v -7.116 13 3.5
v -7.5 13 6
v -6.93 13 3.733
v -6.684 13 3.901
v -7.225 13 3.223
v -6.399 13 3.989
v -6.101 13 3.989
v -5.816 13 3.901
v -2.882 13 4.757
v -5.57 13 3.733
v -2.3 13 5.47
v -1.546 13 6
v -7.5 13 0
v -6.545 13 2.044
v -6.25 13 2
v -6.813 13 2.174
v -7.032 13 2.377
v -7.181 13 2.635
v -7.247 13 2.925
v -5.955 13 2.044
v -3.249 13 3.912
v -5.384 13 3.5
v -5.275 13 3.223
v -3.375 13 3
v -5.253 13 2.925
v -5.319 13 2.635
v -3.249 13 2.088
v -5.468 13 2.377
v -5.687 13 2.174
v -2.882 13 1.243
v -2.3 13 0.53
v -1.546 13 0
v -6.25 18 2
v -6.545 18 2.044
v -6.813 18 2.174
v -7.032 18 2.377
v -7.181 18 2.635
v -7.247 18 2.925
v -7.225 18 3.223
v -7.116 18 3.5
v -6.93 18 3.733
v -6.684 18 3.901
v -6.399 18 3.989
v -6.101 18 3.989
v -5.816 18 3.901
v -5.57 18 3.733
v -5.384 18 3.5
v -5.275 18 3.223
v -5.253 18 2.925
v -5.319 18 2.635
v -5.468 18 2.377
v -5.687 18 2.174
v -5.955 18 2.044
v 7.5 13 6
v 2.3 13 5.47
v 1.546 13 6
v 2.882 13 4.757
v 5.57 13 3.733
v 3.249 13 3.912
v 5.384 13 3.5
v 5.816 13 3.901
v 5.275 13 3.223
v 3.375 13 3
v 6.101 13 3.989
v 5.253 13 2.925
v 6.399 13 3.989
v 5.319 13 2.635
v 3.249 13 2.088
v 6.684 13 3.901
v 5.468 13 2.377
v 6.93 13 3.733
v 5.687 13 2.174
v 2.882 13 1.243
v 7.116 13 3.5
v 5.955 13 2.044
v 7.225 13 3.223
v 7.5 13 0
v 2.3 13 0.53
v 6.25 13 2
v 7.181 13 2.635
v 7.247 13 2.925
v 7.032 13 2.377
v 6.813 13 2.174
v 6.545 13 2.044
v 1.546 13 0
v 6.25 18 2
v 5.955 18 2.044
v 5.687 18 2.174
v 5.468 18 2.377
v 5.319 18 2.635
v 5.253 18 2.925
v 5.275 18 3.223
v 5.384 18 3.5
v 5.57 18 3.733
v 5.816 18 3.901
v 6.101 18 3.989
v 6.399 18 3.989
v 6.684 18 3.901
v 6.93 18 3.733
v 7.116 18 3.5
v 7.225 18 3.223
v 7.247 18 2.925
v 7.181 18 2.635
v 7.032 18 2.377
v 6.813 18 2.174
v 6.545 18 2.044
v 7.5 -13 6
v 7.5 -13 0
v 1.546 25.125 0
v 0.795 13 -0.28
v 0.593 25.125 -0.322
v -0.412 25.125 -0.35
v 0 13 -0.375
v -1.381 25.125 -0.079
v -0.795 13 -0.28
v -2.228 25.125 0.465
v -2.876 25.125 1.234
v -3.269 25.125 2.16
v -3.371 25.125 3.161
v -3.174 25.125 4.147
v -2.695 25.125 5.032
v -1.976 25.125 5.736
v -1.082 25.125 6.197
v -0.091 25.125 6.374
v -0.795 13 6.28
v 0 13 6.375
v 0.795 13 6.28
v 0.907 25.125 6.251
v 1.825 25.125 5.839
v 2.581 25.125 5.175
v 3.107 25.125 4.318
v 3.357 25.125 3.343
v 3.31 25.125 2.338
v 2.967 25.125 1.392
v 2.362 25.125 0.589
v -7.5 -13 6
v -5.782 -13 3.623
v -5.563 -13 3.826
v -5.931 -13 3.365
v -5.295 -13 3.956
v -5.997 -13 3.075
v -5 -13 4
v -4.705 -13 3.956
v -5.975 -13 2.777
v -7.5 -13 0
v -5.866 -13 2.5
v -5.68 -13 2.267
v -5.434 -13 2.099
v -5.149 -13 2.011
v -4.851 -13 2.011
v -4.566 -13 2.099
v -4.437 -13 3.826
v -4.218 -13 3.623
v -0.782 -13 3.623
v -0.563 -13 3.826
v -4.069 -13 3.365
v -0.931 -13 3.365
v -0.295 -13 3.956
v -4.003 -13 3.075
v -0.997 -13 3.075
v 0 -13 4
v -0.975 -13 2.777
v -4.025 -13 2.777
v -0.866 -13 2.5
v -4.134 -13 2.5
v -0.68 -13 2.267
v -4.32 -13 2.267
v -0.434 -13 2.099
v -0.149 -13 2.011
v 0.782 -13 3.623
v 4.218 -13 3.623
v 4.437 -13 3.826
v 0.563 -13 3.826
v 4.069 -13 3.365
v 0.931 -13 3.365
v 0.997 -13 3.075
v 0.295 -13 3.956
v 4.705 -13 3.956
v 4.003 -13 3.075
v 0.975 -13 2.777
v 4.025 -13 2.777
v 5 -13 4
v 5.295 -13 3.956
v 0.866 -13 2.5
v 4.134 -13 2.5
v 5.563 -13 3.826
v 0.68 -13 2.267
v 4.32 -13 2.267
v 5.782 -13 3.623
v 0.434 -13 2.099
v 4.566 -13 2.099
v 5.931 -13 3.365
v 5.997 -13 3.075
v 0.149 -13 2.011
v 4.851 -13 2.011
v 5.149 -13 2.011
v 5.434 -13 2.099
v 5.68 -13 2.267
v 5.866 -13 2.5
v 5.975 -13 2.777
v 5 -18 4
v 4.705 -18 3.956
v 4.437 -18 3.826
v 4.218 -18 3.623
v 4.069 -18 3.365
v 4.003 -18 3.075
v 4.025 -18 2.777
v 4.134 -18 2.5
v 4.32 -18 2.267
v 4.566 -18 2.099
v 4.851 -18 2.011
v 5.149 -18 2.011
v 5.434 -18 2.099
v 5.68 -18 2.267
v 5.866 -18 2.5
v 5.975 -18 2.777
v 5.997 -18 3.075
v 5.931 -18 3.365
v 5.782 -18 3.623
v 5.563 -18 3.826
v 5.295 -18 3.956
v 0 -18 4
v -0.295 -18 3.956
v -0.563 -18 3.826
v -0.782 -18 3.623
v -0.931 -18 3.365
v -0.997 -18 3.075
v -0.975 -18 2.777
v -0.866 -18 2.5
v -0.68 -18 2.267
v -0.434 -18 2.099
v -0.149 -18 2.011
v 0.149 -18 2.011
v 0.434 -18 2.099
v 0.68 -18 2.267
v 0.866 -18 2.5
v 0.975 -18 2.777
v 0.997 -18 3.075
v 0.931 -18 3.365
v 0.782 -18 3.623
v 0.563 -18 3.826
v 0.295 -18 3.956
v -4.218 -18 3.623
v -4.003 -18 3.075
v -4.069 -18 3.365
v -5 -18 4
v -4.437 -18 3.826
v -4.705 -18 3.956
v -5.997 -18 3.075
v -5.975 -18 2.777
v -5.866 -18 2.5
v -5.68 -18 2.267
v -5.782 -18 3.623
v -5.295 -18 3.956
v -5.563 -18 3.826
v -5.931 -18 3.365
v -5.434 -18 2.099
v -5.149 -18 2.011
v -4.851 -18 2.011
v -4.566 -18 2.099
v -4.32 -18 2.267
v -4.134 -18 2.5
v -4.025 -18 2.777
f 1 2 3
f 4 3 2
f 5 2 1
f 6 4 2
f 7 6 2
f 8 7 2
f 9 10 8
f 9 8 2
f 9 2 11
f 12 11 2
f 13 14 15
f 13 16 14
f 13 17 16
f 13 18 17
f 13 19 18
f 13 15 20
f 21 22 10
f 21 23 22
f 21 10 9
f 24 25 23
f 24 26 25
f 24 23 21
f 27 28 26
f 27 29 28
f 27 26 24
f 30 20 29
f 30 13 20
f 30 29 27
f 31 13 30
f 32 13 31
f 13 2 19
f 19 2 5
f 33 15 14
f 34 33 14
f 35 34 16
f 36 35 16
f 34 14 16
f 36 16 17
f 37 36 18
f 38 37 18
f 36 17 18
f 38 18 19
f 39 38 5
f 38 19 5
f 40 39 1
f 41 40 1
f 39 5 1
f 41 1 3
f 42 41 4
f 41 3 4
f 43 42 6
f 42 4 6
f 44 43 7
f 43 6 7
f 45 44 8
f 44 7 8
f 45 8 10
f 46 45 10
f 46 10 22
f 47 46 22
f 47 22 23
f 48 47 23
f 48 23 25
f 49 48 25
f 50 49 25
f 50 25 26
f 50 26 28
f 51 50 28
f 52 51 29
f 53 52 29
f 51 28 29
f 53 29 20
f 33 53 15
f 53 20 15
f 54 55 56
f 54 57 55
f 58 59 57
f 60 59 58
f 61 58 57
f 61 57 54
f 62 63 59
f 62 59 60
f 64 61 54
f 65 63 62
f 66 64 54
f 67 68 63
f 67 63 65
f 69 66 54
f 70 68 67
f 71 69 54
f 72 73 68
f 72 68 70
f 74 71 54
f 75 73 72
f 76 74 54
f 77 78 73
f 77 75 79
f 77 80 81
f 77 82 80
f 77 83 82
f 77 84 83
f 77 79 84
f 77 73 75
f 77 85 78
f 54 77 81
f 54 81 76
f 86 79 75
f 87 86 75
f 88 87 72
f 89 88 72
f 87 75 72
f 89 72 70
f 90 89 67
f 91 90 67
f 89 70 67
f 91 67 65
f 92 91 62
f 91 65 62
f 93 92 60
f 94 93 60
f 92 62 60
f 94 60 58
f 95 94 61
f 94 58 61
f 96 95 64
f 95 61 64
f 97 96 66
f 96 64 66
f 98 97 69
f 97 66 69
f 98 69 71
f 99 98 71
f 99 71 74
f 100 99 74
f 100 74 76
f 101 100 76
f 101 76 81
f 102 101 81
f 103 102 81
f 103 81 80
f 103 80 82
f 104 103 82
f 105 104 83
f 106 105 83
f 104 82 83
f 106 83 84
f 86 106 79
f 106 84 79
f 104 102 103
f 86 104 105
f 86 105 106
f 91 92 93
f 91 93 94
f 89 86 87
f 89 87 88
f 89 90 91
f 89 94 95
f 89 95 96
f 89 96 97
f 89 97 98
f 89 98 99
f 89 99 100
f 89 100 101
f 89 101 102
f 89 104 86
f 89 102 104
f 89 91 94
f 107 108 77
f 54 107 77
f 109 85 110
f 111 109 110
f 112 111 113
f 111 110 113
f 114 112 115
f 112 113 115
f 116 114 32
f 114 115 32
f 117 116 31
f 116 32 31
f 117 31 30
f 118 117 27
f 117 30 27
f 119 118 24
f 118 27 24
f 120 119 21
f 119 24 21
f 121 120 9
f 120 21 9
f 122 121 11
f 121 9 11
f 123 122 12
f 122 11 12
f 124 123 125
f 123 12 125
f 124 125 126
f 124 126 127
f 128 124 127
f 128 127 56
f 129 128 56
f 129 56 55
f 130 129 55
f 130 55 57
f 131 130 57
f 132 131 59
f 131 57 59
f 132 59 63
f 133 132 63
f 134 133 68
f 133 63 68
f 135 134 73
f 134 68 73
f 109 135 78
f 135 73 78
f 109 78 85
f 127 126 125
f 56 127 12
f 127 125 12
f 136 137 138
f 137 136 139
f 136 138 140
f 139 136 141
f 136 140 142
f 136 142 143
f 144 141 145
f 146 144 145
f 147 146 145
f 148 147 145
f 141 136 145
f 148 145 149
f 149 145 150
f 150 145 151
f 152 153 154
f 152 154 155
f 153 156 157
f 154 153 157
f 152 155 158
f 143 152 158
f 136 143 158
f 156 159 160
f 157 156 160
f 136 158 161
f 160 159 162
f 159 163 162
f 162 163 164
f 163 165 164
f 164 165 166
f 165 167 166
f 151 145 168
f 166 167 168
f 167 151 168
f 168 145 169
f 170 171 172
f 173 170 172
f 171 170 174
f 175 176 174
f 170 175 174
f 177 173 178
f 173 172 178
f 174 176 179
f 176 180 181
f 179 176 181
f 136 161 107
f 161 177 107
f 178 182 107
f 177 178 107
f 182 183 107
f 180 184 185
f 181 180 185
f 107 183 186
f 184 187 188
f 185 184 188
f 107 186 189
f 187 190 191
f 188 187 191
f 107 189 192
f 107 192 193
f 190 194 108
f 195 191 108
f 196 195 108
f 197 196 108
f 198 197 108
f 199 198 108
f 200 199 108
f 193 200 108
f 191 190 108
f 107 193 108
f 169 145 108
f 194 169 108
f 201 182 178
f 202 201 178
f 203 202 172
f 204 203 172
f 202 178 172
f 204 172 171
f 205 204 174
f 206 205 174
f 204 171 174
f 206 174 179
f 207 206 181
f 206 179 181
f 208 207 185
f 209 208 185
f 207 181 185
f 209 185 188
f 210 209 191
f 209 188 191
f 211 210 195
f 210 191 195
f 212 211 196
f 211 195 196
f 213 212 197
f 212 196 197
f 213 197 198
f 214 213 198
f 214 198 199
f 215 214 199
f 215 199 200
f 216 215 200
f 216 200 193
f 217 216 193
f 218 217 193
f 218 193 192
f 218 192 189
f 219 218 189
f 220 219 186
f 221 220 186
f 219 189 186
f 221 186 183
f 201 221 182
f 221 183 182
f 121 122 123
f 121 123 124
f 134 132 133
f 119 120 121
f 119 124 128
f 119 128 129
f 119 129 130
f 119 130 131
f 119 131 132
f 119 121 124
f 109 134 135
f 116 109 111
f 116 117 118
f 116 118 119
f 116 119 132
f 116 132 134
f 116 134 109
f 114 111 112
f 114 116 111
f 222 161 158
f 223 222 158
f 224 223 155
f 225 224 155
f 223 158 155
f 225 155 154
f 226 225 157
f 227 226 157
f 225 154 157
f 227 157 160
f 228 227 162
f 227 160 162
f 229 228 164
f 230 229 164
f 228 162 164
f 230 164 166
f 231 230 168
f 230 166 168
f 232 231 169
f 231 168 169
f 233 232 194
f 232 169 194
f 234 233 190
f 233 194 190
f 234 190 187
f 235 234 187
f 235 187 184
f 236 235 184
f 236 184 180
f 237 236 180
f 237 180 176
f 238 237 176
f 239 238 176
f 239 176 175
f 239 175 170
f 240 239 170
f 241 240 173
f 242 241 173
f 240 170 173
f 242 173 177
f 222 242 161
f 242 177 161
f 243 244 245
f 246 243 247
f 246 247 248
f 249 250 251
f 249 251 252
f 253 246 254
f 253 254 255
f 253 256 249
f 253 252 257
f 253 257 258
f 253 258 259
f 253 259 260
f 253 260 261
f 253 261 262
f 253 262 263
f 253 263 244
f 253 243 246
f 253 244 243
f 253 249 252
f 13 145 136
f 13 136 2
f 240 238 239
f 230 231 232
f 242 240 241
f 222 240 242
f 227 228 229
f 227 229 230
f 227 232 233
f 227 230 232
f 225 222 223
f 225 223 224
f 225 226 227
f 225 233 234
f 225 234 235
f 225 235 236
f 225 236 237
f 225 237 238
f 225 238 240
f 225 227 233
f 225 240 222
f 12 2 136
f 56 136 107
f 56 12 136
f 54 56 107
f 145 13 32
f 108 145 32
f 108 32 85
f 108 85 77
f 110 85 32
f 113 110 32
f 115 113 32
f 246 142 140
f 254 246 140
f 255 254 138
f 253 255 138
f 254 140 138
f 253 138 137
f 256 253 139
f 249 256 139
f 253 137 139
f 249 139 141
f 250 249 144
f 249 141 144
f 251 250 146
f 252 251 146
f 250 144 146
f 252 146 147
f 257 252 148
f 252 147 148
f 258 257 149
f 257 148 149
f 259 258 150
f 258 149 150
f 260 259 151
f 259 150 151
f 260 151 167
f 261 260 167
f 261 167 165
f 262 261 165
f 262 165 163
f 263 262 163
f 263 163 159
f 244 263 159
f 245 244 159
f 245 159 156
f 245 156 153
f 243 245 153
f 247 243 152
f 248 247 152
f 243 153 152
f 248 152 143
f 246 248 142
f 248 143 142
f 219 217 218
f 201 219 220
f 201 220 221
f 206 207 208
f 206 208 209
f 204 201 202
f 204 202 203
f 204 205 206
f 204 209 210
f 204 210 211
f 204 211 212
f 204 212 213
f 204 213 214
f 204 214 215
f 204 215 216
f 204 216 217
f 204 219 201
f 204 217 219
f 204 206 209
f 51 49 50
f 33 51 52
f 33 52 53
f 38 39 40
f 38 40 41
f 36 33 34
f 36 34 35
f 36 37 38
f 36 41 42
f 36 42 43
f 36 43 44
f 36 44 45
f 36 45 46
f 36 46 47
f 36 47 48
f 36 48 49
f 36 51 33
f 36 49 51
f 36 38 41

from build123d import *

# Parameters (mm, degrees)
SKETCH1_W           = 15
SKETCH1_H           = 26
BOSS_EXTRUDE1_DEPTH = 6
SKETCH2_R           = 1
BOSS_EXTRUDE2_DEPTH = 5
SKETCH3_R           = 1
BOSS_EXTRUDE3_DEPTH = 5
SKETCH5_R           = 3.375
BOSS_EXTRUDE4_DEPTH = 12.125


with BuildPart() as part:
    # Sketch1 → Boss-Extrude1 (new body)
    with BuildSketch(Plane.XY):
        Rectangle(SKETCH1_W, SKETCH1_H)
    extrude(amount=BOSS_EXTRUDE1_DEPTH)

    # Sketch2 → Boss-Extrude2 (add)
    with BuildSketch(Plane(origin=(0, 13, 0), x_dir=(1, 0, 0), z_dir=(0, 1, 0))):
        with Locations(Location((-6.25, -3, 0), (0, 0, 90))):
            Circle(SKETCH2_R)
        with Locations(Location((6.25, -3, 0), (0, 0, 90))):
            Circle(SKETCH2_R)
    extrude(amount=BOSS_EXTRUDE2_DEPTH)

    # Sketch3 → Boss-Extrude3 (add)
    with BuildSketch(Plane.XZ.offset(13)):
        with Locations(Location((0, 3, 0), (0, 0, 90))):
            Circle(SKETCH3_R)
        with Locations(Location((5, 3, 0), (0, 0, 90))):
            Circle(SKETCH3_R)
        with Locations(Location((-5, 3, 0), (0, 0, 90))):
            Circle(SKETCH3_R)
    extrude(amount=BOSS_EXTRUDE3_DEPTH)

    # Sketch5 → Boss-Extrude4 (add)
    with BuildSketch(Plane(origin=(0, 13, 0), x_dir=(1, 0, 0), z_dir=(0, 1, 0))):
        with Locations(Location((0, -3, 0), (0, 0, 62.733955549))):
            Circle(SKETCH5_R)
    extrude(amount=BOSS_EXTRUDE4_DEPTH)


solid = part.part
